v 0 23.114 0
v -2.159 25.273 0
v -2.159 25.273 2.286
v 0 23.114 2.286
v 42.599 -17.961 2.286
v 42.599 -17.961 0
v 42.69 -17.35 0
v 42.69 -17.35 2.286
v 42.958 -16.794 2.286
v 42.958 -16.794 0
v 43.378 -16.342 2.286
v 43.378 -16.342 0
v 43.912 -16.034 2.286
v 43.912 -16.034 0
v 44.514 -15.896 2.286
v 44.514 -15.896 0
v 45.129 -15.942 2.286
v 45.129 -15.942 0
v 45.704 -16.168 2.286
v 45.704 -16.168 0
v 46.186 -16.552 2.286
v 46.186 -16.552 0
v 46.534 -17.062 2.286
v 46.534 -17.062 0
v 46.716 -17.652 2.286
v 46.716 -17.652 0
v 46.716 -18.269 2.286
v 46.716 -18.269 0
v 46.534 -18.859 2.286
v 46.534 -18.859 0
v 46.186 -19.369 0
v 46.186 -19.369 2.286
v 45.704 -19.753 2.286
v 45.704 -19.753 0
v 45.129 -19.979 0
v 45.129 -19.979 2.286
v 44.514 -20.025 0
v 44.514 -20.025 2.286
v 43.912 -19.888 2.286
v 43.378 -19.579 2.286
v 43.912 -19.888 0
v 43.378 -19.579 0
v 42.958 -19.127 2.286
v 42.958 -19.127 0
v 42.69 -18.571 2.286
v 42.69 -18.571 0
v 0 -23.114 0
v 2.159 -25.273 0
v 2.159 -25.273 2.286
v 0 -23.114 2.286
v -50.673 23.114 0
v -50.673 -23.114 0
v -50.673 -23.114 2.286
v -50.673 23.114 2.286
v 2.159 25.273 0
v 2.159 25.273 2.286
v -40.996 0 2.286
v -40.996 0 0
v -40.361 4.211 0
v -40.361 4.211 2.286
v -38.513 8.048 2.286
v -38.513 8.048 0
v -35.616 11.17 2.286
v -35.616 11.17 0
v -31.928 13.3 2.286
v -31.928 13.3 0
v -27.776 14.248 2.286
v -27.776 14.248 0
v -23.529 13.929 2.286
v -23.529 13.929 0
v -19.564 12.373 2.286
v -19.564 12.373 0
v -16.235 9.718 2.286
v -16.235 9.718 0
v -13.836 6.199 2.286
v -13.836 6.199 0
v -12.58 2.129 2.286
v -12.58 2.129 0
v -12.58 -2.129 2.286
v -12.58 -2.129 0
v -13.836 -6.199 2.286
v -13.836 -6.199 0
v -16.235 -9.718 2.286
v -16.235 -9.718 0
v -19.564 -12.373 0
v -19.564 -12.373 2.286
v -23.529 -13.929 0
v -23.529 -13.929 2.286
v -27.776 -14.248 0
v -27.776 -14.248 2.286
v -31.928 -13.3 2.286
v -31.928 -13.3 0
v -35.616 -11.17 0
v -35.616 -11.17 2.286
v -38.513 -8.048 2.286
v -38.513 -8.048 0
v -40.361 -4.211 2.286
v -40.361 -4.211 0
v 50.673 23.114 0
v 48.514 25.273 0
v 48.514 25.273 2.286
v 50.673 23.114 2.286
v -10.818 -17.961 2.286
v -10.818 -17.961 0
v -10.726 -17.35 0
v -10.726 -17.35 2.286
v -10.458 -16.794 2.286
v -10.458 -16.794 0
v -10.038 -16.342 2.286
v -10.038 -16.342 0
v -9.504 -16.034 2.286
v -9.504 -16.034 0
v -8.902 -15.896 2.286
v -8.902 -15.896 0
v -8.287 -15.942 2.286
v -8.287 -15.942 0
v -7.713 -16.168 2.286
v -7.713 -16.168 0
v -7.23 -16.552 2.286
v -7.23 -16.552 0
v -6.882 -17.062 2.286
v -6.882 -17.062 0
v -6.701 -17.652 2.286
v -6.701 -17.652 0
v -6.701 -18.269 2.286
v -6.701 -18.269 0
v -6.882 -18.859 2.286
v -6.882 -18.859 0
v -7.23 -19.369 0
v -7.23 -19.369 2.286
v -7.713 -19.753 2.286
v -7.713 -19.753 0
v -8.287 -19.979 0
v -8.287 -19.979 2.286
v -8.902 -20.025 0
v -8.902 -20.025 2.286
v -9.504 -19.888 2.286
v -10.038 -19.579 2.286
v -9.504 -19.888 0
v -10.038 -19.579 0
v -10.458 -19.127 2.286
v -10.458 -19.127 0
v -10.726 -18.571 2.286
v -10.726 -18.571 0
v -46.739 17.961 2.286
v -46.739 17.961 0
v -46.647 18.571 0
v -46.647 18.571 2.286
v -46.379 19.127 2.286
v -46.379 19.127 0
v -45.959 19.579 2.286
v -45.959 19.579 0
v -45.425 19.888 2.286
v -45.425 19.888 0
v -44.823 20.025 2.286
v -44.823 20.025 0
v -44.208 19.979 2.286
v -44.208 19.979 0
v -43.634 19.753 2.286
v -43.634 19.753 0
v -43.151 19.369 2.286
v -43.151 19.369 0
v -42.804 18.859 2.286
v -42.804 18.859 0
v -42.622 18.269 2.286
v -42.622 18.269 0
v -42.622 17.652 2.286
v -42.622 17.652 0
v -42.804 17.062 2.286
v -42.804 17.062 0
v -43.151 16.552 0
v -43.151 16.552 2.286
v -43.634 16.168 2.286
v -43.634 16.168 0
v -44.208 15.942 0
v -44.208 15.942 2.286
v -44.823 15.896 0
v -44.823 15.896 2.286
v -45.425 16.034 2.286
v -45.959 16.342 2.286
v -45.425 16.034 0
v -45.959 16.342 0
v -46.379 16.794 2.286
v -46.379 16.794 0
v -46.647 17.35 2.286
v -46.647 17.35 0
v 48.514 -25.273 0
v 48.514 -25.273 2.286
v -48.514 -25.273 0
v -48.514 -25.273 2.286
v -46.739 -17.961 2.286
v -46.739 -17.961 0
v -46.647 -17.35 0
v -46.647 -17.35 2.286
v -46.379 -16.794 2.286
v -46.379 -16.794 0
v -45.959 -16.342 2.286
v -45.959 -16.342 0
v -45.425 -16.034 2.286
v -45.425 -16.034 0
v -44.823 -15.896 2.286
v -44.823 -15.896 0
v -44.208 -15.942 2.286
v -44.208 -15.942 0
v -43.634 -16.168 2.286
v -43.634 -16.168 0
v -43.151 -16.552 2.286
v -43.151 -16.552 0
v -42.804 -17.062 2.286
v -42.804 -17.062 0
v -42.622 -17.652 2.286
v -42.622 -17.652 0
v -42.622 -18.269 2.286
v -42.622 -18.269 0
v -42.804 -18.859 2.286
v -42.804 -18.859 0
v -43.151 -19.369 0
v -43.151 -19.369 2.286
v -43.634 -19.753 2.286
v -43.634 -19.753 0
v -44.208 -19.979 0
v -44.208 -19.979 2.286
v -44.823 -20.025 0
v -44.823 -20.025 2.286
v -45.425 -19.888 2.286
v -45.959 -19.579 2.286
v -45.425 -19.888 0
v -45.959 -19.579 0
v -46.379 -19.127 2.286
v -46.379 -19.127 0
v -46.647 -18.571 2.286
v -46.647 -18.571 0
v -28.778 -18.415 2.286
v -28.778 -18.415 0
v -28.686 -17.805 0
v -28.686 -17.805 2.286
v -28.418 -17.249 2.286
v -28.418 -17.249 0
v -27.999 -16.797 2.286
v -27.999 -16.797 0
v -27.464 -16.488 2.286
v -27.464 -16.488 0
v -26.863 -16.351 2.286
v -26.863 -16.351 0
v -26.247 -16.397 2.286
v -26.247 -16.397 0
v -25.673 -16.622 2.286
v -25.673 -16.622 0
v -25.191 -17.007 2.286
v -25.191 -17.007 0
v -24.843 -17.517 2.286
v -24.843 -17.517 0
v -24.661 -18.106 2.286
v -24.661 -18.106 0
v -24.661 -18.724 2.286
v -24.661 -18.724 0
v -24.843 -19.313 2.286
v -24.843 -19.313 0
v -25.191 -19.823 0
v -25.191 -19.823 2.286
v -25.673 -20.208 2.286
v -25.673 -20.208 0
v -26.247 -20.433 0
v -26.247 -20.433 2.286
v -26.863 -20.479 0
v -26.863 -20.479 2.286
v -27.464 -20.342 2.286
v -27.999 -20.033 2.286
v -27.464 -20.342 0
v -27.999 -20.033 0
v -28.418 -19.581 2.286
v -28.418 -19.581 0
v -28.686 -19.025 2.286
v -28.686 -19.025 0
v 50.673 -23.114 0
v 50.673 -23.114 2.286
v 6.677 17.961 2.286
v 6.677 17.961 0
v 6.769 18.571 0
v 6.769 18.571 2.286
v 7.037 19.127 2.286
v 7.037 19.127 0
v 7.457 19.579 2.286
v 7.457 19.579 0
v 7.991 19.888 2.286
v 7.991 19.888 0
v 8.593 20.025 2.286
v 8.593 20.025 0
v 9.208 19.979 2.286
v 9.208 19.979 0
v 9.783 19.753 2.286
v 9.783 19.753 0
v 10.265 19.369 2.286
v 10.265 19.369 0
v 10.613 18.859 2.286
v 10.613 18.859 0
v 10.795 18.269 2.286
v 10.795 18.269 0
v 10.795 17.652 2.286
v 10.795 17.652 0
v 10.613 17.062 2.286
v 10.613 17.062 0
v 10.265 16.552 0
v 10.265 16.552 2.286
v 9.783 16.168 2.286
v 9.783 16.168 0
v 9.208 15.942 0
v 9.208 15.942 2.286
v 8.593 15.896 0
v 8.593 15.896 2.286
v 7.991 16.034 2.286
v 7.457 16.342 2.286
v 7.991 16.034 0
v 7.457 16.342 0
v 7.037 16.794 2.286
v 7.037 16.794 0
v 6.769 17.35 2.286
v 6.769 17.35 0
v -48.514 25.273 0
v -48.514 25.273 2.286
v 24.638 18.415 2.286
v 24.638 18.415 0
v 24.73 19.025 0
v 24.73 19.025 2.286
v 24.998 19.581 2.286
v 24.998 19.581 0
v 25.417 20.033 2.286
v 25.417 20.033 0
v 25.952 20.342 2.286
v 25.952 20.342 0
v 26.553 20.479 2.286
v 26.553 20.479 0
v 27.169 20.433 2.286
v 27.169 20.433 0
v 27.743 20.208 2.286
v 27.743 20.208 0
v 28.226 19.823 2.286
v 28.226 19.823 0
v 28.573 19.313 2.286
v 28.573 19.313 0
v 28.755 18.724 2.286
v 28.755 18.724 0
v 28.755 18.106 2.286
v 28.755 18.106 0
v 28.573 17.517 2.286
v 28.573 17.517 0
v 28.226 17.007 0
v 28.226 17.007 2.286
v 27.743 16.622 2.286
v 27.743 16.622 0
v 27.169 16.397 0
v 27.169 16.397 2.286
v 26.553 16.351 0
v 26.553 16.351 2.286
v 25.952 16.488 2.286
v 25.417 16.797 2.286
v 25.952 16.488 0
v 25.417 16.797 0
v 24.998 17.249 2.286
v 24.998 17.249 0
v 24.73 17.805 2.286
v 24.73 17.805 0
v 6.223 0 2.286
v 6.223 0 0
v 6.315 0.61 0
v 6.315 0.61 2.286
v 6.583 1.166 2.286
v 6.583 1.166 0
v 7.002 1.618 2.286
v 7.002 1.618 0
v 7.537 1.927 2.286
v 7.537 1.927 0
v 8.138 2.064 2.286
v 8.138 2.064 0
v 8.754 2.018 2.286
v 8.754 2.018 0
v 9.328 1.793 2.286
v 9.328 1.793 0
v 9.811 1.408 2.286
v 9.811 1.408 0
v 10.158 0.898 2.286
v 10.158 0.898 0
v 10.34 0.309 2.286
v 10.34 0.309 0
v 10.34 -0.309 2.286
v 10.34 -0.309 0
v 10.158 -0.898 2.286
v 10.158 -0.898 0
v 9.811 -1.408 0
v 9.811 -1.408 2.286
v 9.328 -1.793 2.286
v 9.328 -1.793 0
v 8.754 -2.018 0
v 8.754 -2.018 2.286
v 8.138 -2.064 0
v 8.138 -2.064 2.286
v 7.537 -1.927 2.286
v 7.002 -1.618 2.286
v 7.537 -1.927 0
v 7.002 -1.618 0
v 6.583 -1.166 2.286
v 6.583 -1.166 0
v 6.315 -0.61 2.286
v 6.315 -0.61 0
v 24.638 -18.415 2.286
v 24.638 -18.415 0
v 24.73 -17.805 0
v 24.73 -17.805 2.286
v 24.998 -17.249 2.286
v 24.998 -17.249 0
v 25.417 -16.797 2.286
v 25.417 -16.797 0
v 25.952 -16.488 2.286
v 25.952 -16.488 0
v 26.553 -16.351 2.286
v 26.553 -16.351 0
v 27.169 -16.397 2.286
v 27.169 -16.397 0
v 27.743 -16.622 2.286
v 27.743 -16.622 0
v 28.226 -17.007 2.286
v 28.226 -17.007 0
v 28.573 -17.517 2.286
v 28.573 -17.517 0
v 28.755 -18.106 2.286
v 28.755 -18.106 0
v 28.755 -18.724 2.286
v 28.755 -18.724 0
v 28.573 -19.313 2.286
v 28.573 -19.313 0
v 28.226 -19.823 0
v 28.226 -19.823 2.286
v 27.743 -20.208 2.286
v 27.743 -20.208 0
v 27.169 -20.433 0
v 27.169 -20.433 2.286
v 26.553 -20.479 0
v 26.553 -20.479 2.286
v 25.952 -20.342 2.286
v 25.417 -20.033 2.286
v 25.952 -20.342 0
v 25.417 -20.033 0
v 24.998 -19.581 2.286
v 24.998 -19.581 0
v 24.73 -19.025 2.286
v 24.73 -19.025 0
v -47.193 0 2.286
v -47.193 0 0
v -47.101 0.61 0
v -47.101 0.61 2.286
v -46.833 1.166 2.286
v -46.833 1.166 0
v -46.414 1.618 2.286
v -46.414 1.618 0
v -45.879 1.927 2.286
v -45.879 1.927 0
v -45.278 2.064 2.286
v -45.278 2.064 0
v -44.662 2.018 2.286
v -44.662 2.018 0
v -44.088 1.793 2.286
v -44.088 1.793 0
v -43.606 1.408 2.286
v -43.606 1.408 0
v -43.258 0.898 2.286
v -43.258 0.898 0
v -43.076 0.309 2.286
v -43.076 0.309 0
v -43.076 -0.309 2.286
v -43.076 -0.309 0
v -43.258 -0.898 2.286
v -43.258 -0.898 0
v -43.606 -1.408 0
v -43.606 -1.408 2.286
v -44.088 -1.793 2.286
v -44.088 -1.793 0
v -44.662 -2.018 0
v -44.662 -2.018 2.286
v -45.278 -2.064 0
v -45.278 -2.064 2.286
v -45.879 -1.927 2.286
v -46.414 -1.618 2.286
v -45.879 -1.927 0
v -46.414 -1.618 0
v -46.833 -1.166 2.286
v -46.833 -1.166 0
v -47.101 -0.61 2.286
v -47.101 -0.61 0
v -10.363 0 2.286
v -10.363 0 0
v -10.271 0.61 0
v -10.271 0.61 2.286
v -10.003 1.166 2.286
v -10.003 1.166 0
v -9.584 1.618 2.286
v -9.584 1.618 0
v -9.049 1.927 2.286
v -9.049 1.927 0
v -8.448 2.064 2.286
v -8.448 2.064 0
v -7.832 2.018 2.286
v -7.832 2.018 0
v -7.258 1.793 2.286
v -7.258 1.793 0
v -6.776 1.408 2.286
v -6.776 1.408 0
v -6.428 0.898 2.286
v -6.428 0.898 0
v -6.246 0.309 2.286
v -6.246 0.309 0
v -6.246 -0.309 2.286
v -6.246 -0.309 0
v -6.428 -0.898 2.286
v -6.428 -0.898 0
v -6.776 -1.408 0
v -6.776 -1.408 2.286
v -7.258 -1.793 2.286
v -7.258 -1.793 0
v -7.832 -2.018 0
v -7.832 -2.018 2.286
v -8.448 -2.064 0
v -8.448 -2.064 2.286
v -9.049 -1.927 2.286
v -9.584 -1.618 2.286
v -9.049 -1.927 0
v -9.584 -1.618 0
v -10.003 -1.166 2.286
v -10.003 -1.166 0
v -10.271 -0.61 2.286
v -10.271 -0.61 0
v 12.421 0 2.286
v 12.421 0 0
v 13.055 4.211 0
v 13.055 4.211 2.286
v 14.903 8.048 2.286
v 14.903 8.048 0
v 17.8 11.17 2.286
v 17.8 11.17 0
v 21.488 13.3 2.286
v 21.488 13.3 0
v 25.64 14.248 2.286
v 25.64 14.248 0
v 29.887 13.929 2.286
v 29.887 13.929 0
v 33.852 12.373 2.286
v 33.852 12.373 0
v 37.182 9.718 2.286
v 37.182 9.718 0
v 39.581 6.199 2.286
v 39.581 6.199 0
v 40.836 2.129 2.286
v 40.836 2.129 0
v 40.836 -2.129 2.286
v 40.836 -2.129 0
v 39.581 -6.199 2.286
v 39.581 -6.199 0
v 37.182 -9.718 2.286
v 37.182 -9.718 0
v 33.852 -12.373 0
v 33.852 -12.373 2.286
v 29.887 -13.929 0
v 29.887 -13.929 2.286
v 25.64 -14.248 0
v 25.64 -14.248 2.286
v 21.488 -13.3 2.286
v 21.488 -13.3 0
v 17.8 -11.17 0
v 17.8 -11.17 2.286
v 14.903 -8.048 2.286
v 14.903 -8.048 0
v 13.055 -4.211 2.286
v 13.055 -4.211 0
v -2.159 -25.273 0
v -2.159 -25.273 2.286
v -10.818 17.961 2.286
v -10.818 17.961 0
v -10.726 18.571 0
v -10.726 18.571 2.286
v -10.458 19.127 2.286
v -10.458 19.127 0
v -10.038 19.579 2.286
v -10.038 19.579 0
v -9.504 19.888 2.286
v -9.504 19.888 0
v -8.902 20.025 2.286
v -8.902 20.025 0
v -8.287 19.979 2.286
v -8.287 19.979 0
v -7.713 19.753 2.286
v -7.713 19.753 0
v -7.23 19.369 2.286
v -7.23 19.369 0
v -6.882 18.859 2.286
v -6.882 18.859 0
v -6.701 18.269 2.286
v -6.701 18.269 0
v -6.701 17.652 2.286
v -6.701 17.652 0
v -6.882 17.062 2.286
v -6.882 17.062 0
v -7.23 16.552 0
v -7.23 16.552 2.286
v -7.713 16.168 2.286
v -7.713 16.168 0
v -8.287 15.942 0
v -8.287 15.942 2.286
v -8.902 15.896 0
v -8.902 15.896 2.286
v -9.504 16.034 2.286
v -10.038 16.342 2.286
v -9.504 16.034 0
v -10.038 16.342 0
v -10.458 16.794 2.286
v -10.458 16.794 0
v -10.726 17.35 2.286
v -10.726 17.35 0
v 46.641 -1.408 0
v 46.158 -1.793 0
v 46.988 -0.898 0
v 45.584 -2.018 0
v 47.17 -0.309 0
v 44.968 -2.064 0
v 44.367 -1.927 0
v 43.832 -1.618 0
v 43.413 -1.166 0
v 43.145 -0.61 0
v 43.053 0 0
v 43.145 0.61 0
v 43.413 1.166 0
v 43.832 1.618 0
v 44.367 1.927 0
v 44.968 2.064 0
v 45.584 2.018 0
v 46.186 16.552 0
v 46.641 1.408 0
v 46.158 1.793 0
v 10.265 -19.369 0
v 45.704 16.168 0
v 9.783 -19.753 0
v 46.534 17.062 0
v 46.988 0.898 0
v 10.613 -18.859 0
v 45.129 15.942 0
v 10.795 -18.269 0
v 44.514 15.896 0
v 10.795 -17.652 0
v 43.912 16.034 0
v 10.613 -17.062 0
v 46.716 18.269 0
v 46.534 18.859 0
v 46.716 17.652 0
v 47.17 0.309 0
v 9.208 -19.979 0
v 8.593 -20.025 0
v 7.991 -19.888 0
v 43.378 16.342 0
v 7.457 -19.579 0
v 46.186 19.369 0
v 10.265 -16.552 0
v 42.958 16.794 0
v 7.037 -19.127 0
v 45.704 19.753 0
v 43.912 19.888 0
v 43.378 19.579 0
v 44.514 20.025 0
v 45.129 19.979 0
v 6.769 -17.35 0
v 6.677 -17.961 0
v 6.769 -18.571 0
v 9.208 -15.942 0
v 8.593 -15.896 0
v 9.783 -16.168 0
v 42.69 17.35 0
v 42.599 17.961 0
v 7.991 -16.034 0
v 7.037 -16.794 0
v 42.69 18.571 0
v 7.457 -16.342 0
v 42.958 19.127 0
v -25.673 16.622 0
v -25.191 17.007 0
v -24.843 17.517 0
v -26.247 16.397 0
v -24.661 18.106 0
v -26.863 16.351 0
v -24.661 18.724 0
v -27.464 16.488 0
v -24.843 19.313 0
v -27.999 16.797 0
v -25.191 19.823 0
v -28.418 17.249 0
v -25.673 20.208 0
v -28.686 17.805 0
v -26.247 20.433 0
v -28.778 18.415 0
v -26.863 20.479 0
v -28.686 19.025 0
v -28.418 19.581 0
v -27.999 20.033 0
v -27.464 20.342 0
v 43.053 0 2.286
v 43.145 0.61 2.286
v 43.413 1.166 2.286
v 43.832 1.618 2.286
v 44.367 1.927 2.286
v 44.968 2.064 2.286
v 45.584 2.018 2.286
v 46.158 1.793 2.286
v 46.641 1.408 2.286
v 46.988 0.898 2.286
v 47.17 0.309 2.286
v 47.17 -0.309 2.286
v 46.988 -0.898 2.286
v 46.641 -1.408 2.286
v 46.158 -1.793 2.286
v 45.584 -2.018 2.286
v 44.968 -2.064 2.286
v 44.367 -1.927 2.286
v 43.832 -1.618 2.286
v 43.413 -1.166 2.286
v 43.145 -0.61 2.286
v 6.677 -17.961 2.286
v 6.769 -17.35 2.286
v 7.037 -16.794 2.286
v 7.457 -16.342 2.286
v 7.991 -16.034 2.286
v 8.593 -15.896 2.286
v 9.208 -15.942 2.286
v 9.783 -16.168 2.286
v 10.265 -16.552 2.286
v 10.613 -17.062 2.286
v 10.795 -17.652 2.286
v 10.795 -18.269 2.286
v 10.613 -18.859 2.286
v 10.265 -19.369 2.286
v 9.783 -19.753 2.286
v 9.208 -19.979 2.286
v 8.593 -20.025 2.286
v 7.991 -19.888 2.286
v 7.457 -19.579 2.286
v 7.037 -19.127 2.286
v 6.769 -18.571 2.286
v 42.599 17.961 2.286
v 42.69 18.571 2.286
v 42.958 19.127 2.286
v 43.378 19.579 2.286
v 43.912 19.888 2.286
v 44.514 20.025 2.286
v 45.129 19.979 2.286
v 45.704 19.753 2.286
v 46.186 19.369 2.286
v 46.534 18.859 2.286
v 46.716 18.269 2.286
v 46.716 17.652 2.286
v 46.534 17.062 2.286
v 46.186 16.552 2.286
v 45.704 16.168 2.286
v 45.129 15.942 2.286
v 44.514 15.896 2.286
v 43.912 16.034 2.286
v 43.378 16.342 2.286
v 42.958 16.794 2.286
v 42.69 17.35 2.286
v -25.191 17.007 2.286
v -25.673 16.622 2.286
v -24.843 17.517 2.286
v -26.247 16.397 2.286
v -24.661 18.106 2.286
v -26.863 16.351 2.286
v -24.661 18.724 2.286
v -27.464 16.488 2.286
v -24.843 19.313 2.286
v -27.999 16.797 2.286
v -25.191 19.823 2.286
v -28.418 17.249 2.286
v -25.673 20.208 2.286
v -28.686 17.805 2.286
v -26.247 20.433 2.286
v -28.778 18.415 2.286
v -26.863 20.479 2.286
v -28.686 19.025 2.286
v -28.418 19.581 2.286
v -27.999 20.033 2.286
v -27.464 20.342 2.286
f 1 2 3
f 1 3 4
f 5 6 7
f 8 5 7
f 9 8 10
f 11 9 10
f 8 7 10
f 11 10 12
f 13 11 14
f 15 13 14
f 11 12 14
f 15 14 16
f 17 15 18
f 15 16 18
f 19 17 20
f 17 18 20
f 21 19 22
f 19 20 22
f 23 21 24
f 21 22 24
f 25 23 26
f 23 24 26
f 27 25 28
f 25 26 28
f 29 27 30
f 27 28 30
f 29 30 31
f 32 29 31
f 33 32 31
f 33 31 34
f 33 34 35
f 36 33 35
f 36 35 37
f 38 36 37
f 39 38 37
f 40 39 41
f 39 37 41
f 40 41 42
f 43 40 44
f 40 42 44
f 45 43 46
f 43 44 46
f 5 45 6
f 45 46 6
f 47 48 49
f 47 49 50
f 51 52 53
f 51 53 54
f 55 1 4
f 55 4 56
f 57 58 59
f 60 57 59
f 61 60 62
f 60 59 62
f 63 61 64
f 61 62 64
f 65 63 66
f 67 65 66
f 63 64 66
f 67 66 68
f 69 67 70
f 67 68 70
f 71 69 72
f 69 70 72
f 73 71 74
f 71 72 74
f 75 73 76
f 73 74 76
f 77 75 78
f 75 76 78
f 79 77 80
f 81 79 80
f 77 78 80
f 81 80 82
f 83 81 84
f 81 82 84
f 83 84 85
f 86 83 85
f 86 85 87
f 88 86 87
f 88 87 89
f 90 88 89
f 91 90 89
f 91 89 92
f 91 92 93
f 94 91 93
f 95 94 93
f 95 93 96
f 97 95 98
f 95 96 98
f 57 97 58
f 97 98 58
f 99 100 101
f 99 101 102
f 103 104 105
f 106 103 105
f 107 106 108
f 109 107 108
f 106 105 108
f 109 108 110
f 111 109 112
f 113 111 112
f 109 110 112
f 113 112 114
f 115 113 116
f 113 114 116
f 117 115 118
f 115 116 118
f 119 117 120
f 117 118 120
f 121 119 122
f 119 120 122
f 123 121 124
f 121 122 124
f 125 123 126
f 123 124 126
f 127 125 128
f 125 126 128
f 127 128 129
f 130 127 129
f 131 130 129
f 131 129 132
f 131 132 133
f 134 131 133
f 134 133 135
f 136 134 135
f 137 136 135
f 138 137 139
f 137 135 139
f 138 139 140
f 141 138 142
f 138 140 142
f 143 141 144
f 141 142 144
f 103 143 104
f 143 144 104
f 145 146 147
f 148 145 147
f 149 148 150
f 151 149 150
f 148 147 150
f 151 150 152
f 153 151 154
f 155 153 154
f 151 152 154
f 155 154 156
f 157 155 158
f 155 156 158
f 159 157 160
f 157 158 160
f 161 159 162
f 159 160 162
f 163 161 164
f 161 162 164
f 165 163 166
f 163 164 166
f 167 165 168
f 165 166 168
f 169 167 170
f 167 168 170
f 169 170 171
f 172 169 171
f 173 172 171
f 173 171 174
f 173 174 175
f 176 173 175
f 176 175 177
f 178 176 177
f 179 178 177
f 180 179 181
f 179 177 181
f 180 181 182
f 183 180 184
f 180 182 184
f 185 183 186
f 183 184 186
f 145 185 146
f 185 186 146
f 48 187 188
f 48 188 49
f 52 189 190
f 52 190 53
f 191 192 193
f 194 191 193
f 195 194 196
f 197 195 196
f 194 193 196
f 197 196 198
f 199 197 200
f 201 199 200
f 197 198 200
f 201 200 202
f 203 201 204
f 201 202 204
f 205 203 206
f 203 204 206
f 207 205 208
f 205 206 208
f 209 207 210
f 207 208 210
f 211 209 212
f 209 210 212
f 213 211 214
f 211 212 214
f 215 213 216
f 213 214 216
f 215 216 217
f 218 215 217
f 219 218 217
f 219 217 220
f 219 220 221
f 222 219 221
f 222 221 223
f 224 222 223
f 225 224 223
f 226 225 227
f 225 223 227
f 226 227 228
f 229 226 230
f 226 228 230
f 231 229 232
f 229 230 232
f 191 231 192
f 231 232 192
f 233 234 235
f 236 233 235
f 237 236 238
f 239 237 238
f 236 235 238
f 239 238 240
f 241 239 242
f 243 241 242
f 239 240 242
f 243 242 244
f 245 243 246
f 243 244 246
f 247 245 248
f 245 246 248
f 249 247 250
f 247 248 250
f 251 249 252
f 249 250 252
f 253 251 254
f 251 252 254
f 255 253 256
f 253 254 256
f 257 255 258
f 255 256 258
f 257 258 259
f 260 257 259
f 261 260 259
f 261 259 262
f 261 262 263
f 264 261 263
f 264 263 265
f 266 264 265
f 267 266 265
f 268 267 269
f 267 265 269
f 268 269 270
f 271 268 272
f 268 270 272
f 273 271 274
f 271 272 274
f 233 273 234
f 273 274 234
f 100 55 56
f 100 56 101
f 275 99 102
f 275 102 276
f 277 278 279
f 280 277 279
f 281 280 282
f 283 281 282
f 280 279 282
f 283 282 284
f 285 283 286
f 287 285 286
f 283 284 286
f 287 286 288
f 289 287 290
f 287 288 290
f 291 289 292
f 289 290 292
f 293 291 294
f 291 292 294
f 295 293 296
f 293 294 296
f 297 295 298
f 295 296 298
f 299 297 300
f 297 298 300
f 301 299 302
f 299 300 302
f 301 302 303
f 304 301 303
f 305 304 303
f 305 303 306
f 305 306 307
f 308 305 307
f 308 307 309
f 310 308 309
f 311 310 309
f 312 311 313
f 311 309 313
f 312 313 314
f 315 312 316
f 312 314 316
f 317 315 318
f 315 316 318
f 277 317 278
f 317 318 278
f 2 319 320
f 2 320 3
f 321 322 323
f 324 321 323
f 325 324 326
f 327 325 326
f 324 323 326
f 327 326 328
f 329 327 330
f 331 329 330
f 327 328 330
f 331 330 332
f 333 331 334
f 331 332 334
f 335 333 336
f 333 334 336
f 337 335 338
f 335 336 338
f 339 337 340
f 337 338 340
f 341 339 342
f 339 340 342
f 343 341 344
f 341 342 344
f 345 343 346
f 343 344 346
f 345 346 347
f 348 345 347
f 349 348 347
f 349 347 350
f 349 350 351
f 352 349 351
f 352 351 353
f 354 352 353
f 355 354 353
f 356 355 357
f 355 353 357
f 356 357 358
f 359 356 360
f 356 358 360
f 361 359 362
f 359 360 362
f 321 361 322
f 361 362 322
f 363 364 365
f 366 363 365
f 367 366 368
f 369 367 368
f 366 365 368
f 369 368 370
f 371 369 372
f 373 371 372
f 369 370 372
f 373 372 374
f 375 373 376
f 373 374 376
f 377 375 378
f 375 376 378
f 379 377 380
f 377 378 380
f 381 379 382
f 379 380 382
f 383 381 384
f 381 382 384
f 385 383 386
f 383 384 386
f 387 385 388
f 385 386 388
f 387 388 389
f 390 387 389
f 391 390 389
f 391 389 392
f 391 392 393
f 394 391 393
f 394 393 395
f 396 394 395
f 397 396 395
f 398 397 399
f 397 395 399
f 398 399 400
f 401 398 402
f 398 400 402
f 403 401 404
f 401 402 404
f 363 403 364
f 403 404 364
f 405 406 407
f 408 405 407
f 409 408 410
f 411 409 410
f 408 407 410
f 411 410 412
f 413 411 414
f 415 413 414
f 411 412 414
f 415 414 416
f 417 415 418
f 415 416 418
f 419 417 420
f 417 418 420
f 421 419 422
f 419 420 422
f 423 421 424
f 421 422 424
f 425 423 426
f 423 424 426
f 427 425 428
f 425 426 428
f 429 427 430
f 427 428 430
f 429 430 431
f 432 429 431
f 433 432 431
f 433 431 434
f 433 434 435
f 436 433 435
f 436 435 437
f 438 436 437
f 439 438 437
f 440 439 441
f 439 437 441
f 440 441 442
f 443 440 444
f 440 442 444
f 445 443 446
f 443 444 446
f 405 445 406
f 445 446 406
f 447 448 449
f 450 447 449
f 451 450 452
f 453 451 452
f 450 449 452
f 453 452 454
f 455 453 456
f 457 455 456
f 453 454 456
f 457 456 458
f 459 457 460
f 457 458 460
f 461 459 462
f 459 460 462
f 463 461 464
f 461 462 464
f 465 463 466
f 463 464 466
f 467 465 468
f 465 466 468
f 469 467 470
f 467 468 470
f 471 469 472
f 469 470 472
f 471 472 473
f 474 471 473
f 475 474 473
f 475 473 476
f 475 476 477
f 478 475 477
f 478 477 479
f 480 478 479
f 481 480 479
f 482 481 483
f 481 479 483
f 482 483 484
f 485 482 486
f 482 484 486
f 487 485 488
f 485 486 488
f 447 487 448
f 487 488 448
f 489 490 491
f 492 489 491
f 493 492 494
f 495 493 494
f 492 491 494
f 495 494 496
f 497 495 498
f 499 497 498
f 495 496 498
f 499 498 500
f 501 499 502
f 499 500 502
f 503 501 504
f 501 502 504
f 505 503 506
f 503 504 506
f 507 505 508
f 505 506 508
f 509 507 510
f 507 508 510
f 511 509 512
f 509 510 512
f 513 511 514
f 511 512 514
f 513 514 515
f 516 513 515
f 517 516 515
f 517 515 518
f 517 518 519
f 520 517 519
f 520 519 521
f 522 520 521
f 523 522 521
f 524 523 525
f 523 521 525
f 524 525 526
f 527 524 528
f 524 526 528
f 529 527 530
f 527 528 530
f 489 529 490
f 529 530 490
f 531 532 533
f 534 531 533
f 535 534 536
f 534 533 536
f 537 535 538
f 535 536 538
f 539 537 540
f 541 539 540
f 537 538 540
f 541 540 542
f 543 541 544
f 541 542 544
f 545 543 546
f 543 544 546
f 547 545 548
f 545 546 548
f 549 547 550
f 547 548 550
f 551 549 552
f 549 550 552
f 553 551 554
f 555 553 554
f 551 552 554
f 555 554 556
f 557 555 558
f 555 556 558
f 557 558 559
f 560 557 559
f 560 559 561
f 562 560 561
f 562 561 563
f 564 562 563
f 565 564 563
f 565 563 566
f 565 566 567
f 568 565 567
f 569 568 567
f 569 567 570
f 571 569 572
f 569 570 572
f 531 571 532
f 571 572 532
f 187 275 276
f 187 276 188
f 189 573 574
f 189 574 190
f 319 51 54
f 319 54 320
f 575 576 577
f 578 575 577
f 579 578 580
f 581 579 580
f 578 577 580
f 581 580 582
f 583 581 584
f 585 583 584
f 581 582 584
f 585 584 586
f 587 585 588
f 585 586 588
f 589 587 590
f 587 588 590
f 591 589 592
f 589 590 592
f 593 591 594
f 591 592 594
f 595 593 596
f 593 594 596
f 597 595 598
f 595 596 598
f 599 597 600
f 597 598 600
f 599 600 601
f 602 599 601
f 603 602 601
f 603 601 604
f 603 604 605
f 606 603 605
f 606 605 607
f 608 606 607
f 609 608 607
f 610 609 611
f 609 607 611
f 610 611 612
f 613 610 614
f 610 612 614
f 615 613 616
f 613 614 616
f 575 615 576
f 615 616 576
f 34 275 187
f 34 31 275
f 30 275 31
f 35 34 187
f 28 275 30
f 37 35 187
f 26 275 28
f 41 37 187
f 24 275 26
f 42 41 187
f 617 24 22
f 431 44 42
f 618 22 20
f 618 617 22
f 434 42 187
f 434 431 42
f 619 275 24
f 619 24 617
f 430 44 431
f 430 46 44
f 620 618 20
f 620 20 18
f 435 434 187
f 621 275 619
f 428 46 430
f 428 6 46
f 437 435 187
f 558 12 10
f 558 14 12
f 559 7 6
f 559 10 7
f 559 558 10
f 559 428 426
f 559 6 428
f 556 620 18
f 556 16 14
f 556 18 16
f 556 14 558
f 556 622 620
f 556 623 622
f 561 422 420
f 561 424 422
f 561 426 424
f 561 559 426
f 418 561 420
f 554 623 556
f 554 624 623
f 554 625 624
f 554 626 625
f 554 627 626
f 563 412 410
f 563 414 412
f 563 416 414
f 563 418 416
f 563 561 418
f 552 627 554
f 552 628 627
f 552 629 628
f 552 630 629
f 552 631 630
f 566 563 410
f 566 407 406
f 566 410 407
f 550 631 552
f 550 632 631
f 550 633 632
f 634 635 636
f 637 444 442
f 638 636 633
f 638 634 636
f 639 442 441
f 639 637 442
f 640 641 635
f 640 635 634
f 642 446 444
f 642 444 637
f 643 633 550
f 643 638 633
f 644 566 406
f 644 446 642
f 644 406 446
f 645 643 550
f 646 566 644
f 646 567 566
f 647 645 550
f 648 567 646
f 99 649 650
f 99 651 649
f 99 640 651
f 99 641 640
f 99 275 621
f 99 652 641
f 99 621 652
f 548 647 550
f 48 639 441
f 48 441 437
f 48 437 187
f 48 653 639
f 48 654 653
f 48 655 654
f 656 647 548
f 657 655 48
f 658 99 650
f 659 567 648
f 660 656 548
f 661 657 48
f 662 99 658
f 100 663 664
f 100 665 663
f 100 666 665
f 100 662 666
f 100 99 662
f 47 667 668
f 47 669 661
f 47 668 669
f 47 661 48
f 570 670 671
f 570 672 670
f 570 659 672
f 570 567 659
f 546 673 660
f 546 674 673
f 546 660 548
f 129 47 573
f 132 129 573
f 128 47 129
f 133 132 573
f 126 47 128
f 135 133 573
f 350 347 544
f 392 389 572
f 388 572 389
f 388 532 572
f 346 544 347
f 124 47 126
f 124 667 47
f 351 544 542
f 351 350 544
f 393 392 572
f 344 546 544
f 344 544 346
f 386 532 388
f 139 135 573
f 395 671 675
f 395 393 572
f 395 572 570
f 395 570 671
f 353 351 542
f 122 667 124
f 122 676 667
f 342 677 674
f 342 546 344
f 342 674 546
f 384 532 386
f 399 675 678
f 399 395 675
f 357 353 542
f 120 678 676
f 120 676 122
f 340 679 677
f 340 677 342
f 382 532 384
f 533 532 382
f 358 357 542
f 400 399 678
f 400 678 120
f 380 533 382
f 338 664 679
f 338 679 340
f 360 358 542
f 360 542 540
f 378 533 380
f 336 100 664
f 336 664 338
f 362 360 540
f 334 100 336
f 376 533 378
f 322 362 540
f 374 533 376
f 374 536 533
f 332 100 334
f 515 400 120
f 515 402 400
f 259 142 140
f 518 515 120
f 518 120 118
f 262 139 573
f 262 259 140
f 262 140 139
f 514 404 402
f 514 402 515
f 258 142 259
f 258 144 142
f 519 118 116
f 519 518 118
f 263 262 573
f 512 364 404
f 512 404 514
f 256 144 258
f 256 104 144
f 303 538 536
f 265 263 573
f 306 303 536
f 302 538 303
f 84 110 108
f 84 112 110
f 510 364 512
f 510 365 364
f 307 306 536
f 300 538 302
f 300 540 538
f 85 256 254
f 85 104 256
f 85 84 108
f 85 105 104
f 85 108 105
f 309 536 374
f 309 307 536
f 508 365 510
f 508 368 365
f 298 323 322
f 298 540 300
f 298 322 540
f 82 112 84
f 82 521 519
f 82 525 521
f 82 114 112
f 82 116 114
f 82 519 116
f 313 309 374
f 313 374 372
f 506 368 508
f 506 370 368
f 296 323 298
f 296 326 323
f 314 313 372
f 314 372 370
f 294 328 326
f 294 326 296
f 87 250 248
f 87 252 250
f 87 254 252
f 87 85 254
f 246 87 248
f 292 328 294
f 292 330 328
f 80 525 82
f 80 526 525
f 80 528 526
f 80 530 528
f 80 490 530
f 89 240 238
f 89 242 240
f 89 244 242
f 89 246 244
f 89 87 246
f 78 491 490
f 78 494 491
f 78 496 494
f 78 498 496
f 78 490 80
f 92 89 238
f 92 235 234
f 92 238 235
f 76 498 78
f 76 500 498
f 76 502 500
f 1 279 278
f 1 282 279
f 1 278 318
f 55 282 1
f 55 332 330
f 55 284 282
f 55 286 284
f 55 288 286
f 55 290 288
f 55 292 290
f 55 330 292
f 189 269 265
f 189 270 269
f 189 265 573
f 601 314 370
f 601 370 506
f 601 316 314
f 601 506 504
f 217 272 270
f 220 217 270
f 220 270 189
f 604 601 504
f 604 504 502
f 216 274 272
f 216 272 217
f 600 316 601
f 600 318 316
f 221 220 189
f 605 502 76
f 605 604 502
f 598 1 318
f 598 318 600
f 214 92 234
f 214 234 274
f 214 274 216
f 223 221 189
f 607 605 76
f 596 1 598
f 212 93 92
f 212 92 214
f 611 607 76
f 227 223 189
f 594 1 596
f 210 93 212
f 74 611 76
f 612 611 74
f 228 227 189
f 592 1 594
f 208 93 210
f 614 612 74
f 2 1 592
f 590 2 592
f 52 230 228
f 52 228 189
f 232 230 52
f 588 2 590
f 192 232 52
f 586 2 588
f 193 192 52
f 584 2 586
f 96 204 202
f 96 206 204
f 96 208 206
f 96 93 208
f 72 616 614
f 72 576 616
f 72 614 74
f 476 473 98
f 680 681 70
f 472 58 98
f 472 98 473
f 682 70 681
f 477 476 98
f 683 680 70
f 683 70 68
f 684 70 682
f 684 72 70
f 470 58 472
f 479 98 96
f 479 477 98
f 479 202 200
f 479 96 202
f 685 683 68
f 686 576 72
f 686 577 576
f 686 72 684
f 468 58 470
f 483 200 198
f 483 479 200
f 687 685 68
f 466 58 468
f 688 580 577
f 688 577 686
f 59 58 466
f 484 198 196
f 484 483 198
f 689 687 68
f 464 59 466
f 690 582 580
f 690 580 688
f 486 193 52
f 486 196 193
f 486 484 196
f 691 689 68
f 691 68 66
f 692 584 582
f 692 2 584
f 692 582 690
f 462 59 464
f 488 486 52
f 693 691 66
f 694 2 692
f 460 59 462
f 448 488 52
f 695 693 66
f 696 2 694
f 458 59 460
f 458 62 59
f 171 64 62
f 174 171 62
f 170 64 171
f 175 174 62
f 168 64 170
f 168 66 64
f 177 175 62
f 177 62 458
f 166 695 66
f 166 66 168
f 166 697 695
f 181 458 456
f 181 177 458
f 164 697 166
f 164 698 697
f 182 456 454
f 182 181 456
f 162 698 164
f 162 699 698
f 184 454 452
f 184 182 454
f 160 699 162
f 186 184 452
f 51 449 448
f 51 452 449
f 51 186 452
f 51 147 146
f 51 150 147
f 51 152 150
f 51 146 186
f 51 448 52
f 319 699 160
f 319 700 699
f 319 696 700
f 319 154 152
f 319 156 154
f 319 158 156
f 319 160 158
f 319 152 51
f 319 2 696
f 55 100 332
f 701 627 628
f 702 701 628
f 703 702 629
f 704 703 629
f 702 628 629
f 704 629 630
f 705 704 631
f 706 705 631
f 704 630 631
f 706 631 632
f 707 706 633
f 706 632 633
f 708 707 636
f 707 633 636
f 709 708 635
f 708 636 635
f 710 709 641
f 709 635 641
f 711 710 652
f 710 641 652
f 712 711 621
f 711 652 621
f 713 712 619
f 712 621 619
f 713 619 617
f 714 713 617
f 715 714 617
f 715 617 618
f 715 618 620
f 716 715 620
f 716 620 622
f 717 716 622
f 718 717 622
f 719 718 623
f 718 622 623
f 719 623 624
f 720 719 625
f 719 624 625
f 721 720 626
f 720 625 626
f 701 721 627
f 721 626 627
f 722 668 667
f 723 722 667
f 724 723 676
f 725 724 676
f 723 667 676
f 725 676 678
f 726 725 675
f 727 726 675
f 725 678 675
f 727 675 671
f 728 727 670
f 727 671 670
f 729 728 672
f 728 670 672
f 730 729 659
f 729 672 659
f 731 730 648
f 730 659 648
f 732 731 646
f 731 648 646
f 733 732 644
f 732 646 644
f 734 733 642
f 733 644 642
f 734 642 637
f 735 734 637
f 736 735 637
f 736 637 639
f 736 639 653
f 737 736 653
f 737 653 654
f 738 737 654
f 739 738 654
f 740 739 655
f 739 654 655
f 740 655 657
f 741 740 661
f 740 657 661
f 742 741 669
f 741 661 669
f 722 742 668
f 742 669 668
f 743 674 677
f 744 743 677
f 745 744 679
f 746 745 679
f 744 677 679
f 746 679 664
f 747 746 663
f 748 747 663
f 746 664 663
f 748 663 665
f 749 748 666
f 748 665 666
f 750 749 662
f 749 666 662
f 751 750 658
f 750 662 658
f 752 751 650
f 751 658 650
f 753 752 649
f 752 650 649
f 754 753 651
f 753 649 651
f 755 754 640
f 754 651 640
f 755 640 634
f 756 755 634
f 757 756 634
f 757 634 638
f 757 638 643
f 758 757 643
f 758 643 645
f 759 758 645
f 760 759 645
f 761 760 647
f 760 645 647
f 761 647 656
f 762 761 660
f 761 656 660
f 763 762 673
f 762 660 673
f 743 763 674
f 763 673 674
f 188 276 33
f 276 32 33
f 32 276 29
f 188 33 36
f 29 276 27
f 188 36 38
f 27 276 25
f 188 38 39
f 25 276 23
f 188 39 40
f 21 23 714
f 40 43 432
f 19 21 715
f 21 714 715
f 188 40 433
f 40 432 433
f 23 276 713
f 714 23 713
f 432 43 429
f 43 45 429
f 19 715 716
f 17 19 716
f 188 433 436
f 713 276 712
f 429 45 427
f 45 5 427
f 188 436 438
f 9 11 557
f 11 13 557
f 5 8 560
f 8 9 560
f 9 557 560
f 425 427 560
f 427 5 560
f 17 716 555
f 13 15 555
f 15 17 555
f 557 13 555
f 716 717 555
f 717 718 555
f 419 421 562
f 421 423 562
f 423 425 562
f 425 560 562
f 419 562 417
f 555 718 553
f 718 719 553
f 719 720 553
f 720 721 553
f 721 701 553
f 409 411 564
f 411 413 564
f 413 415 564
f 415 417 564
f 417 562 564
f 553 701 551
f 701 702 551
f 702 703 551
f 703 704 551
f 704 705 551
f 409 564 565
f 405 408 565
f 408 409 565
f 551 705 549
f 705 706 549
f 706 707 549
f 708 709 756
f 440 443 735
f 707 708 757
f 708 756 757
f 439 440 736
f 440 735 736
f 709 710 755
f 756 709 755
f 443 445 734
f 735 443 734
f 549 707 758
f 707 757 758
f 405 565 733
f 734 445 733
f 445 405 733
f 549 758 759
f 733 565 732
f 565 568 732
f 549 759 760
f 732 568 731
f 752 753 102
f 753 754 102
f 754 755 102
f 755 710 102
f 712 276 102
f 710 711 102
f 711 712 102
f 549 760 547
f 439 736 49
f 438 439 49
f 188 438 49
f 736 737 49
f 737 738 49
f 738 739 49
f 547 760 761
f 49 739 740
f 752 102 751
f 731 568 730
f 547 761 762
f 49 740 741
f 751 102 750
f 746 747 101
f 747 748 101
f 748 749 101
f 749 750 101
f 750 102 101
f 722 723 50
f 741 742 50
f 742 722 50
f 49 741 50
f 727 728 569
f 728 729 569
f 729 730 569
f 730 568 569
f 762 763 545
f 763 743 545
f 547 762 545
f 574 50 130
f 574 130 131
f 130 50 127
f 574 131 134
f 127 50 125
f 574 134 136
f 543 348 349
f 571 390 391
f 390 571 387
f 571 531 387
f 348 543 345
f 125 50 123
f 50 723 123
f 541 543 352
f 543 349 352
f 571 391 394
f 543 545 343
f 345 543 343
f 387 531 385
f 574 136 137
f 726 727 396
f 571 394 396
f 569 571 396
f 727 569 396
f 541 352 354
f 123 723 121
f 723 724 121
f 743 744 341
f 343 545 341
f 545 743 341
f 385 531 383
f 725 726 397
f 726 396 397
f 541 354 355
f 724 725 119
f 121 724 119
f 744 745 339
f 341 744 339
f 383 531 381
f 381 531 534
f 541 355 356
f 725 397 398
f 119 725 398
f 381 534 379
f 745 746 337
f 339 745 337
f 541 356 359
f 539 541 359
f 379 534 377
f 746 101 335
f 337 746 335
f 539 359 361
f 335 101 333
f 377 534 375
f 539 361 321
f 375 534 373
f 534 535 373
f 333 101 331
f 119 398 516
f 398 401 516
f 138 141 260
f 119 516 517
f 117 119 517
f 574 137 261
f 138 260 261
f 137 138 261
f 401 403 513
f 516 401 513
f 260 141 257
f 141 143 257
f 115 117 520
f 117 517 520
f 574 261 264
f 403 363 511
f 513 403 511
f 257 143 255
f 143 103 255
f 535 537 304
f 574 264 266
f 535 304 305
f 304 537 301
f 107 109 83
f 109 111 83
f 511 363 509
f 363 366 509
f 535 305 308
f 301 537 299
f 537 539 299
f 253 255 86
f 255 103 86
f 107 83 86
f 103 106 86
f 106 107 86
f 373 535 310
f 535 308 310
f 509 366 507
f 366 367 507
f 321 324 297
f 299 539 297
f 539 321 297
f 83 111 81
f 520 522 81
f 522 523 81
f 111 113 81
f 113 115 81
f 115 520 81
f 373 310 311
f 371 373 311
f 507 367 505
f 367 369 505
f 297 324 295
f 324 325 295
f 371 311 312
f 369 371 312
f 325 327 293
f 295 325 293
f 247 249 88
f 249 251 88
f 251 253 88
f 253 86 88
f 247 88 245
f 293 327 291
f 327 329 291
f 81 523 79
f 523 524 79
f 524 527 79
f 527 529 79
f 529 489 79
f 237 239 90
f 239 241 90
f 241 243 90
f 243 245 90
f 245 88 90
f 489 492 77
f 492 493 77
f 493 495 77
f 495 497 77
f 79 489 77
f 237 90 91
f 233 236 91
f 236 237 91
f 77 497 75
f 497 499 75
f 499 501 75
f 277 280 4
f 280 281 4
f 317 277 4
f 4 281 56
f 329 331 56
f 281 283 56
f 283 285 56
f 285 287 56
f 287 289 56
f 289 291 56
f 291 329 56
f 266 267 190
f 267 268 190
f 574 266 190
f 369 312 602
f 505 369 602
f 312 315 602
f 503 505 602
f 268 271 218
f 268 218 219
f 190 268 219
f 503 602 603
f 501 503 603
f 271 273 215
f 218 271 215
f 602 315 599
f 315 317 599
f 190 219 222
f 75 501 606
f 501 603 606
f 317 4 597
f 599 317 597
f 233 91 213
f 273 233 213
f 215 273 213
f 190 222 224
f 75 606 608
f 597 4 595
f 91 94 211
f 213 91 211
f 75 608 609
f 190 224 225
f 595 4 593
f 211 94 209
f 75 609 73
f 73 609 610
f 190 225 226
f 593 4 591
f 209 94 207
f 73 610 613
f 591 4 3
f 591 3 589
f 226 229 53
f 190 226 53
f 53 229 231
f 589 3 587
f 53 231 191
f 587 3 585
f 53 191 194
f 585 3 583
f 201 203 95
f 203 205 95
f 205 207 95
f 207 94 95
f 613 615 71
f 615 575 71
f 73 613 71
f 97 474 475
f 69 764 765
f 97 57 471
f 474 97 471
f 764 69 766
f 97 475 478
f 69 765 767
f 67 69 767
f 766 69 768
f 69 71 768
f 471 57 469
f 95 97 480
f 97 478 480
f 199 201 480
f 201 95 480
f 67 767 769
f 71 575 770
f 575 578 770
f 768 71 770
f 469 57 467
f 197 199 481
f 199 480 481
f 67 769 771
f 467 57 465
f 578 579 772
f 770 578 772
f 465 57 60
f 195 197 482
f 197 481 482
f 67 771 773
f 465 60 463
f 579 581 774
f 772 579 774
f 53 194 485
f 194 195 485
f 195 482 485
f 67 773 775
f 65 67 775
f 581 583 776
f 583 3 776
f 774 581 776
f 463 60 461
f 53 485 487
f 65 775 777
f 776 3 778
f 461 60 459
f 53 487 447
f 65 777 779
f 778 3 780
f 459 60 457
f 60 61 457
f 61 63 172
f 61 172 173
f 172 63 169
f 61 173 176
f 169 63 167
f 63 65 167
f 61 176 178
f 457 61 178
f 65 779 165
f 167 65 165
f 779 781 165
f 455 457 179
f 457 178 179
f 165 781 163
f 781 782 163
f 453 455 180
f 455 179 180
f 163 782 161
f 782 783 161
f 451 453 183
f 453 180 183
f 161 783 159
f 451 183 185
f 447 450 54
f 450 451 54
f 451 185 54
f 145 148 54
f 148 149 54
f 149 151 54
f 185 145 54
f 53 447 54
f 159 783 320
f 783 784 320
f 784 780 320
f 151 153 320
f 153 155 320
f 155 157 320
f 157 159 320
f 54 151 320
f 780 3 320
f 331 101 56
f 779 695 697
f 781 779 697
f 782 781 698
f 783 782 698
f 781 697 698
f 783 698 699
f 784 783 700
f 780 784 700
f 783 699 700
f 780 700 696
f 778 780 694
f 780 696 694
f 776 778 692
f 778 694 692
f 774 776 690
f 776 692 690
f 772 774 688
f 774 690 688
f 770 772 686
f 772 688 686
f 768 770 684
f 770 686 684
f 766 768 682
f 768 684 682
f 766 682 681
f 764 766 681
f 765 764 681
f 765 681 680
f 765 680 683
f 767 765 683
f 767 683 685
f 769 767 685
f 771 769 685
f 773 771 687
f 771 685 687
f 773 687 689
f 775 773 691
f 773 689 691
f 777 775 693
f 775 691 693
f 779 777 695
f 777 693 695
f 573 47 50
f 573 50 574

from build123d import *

# Parameters (mm, degrees)
SKETCH1_R           = 2.0701
SKETCH1_R_2         = 14.2875
BOSS_EXTRUDE1_DEPTH = 2.286


with BuildPart() as part:
    # Sketch1 → Boss-Extrude1 (new body)
    with BuildSketch(Plane(origin=(0, 0, 0), x_dir=(-1, 0, 0), z_dir=(0, 0, -1))):
        Polygon((0, -23.114), (2.159, -25.273), (48.514, -25.273), (50.673, -23.114), (50.673, 23.114), (48.514, 25.273), (2.159, 25.273), (0, 23.114), (-2.159, 25.273), (-48.514, 25.273), (-50.673, 23.114), (-50.673, -23.114), (-48.514, -25.273), (-2.159, -25.273), align=None)
        with Locations((26.7081, -18.415)):
            Circle(SKETCH1_R, mode=Mode.SUBTRACT)
        with Locations((-45.1231, 0)):
            Circle(SKETCH1_R, mode=Mode.SUBTRACT)
        with Locations((26.7081, 18.415)):
            Circle(SKETCH1_R, mode=Mode.SUBTRACT)
        with Locations((-26.7081, 18.415)):
            Circle(SKETCH1_R, mode=Mode.SUBTRACT)
        with Locations((8.747587758, 17.960512242)):
            Circle(SKETCH1_R, mode=Mode.SUBTRACT)
        with Locations((44.668612242, 17.960512242)):
            Circle(SKETCH1_R, mode=Mode.SUBTRACT)
        with Locations((26.7081, 0)):
            Circle(SKETCH1_R_2, mode=Mode.SUBTRACT)
        with Locations((-44.668612242, -17.960512242)):
            Circle(SKETCH1_R, mode=Mode.SUBTRACT)
        with Locations((-8.747587758, 17.960512242)):
            Circle(SKETCH1_R, mode=Mode.SUBTRACT)
        with Locations((-26.7081, 0)):
            Circle(SKETCH1_R_2, mode=Mode.SUBTRACT)
        with Locations((-8.747587758, -17.960512242)):
            Circle(SKETCH1_R, mode=Mode.SUBTRACT)
        with Locations((-44.668612242, 17.960512242)):
            Circle(SKETCH1_R, mode=Mode.SUBTRACT)
        with Locations((44.668612242, -17.960512242)):
            Circle(SKETCH1_R, mode=Mode.SUBTRACT)
        with Locations((8.747587758, -17.960512242)):
            Circle(SKETCH1_R, mode=Mode.SUBTRACT)
        with Locations((-8.2931, 0)):
            Circle(SKETCH1_R, mode=Mode.SUBTRACT)
        with Locations((45.1231, 0)):
            Circle(SKETCH1_R, mode=Mode.SUBTRACT)
        with Locations((8.2931, 0)):
            Circle(SKETCH1_R, mode=Mode.SUBTRACT)
        with Locations((-26.7081, -18.415)):
            Circle(SKETCH1_R, mode=Mode.SUBTRACT)
    extrude(amount=-BOSS_EXTRUDE1_DEPTH)


solid = part.part
